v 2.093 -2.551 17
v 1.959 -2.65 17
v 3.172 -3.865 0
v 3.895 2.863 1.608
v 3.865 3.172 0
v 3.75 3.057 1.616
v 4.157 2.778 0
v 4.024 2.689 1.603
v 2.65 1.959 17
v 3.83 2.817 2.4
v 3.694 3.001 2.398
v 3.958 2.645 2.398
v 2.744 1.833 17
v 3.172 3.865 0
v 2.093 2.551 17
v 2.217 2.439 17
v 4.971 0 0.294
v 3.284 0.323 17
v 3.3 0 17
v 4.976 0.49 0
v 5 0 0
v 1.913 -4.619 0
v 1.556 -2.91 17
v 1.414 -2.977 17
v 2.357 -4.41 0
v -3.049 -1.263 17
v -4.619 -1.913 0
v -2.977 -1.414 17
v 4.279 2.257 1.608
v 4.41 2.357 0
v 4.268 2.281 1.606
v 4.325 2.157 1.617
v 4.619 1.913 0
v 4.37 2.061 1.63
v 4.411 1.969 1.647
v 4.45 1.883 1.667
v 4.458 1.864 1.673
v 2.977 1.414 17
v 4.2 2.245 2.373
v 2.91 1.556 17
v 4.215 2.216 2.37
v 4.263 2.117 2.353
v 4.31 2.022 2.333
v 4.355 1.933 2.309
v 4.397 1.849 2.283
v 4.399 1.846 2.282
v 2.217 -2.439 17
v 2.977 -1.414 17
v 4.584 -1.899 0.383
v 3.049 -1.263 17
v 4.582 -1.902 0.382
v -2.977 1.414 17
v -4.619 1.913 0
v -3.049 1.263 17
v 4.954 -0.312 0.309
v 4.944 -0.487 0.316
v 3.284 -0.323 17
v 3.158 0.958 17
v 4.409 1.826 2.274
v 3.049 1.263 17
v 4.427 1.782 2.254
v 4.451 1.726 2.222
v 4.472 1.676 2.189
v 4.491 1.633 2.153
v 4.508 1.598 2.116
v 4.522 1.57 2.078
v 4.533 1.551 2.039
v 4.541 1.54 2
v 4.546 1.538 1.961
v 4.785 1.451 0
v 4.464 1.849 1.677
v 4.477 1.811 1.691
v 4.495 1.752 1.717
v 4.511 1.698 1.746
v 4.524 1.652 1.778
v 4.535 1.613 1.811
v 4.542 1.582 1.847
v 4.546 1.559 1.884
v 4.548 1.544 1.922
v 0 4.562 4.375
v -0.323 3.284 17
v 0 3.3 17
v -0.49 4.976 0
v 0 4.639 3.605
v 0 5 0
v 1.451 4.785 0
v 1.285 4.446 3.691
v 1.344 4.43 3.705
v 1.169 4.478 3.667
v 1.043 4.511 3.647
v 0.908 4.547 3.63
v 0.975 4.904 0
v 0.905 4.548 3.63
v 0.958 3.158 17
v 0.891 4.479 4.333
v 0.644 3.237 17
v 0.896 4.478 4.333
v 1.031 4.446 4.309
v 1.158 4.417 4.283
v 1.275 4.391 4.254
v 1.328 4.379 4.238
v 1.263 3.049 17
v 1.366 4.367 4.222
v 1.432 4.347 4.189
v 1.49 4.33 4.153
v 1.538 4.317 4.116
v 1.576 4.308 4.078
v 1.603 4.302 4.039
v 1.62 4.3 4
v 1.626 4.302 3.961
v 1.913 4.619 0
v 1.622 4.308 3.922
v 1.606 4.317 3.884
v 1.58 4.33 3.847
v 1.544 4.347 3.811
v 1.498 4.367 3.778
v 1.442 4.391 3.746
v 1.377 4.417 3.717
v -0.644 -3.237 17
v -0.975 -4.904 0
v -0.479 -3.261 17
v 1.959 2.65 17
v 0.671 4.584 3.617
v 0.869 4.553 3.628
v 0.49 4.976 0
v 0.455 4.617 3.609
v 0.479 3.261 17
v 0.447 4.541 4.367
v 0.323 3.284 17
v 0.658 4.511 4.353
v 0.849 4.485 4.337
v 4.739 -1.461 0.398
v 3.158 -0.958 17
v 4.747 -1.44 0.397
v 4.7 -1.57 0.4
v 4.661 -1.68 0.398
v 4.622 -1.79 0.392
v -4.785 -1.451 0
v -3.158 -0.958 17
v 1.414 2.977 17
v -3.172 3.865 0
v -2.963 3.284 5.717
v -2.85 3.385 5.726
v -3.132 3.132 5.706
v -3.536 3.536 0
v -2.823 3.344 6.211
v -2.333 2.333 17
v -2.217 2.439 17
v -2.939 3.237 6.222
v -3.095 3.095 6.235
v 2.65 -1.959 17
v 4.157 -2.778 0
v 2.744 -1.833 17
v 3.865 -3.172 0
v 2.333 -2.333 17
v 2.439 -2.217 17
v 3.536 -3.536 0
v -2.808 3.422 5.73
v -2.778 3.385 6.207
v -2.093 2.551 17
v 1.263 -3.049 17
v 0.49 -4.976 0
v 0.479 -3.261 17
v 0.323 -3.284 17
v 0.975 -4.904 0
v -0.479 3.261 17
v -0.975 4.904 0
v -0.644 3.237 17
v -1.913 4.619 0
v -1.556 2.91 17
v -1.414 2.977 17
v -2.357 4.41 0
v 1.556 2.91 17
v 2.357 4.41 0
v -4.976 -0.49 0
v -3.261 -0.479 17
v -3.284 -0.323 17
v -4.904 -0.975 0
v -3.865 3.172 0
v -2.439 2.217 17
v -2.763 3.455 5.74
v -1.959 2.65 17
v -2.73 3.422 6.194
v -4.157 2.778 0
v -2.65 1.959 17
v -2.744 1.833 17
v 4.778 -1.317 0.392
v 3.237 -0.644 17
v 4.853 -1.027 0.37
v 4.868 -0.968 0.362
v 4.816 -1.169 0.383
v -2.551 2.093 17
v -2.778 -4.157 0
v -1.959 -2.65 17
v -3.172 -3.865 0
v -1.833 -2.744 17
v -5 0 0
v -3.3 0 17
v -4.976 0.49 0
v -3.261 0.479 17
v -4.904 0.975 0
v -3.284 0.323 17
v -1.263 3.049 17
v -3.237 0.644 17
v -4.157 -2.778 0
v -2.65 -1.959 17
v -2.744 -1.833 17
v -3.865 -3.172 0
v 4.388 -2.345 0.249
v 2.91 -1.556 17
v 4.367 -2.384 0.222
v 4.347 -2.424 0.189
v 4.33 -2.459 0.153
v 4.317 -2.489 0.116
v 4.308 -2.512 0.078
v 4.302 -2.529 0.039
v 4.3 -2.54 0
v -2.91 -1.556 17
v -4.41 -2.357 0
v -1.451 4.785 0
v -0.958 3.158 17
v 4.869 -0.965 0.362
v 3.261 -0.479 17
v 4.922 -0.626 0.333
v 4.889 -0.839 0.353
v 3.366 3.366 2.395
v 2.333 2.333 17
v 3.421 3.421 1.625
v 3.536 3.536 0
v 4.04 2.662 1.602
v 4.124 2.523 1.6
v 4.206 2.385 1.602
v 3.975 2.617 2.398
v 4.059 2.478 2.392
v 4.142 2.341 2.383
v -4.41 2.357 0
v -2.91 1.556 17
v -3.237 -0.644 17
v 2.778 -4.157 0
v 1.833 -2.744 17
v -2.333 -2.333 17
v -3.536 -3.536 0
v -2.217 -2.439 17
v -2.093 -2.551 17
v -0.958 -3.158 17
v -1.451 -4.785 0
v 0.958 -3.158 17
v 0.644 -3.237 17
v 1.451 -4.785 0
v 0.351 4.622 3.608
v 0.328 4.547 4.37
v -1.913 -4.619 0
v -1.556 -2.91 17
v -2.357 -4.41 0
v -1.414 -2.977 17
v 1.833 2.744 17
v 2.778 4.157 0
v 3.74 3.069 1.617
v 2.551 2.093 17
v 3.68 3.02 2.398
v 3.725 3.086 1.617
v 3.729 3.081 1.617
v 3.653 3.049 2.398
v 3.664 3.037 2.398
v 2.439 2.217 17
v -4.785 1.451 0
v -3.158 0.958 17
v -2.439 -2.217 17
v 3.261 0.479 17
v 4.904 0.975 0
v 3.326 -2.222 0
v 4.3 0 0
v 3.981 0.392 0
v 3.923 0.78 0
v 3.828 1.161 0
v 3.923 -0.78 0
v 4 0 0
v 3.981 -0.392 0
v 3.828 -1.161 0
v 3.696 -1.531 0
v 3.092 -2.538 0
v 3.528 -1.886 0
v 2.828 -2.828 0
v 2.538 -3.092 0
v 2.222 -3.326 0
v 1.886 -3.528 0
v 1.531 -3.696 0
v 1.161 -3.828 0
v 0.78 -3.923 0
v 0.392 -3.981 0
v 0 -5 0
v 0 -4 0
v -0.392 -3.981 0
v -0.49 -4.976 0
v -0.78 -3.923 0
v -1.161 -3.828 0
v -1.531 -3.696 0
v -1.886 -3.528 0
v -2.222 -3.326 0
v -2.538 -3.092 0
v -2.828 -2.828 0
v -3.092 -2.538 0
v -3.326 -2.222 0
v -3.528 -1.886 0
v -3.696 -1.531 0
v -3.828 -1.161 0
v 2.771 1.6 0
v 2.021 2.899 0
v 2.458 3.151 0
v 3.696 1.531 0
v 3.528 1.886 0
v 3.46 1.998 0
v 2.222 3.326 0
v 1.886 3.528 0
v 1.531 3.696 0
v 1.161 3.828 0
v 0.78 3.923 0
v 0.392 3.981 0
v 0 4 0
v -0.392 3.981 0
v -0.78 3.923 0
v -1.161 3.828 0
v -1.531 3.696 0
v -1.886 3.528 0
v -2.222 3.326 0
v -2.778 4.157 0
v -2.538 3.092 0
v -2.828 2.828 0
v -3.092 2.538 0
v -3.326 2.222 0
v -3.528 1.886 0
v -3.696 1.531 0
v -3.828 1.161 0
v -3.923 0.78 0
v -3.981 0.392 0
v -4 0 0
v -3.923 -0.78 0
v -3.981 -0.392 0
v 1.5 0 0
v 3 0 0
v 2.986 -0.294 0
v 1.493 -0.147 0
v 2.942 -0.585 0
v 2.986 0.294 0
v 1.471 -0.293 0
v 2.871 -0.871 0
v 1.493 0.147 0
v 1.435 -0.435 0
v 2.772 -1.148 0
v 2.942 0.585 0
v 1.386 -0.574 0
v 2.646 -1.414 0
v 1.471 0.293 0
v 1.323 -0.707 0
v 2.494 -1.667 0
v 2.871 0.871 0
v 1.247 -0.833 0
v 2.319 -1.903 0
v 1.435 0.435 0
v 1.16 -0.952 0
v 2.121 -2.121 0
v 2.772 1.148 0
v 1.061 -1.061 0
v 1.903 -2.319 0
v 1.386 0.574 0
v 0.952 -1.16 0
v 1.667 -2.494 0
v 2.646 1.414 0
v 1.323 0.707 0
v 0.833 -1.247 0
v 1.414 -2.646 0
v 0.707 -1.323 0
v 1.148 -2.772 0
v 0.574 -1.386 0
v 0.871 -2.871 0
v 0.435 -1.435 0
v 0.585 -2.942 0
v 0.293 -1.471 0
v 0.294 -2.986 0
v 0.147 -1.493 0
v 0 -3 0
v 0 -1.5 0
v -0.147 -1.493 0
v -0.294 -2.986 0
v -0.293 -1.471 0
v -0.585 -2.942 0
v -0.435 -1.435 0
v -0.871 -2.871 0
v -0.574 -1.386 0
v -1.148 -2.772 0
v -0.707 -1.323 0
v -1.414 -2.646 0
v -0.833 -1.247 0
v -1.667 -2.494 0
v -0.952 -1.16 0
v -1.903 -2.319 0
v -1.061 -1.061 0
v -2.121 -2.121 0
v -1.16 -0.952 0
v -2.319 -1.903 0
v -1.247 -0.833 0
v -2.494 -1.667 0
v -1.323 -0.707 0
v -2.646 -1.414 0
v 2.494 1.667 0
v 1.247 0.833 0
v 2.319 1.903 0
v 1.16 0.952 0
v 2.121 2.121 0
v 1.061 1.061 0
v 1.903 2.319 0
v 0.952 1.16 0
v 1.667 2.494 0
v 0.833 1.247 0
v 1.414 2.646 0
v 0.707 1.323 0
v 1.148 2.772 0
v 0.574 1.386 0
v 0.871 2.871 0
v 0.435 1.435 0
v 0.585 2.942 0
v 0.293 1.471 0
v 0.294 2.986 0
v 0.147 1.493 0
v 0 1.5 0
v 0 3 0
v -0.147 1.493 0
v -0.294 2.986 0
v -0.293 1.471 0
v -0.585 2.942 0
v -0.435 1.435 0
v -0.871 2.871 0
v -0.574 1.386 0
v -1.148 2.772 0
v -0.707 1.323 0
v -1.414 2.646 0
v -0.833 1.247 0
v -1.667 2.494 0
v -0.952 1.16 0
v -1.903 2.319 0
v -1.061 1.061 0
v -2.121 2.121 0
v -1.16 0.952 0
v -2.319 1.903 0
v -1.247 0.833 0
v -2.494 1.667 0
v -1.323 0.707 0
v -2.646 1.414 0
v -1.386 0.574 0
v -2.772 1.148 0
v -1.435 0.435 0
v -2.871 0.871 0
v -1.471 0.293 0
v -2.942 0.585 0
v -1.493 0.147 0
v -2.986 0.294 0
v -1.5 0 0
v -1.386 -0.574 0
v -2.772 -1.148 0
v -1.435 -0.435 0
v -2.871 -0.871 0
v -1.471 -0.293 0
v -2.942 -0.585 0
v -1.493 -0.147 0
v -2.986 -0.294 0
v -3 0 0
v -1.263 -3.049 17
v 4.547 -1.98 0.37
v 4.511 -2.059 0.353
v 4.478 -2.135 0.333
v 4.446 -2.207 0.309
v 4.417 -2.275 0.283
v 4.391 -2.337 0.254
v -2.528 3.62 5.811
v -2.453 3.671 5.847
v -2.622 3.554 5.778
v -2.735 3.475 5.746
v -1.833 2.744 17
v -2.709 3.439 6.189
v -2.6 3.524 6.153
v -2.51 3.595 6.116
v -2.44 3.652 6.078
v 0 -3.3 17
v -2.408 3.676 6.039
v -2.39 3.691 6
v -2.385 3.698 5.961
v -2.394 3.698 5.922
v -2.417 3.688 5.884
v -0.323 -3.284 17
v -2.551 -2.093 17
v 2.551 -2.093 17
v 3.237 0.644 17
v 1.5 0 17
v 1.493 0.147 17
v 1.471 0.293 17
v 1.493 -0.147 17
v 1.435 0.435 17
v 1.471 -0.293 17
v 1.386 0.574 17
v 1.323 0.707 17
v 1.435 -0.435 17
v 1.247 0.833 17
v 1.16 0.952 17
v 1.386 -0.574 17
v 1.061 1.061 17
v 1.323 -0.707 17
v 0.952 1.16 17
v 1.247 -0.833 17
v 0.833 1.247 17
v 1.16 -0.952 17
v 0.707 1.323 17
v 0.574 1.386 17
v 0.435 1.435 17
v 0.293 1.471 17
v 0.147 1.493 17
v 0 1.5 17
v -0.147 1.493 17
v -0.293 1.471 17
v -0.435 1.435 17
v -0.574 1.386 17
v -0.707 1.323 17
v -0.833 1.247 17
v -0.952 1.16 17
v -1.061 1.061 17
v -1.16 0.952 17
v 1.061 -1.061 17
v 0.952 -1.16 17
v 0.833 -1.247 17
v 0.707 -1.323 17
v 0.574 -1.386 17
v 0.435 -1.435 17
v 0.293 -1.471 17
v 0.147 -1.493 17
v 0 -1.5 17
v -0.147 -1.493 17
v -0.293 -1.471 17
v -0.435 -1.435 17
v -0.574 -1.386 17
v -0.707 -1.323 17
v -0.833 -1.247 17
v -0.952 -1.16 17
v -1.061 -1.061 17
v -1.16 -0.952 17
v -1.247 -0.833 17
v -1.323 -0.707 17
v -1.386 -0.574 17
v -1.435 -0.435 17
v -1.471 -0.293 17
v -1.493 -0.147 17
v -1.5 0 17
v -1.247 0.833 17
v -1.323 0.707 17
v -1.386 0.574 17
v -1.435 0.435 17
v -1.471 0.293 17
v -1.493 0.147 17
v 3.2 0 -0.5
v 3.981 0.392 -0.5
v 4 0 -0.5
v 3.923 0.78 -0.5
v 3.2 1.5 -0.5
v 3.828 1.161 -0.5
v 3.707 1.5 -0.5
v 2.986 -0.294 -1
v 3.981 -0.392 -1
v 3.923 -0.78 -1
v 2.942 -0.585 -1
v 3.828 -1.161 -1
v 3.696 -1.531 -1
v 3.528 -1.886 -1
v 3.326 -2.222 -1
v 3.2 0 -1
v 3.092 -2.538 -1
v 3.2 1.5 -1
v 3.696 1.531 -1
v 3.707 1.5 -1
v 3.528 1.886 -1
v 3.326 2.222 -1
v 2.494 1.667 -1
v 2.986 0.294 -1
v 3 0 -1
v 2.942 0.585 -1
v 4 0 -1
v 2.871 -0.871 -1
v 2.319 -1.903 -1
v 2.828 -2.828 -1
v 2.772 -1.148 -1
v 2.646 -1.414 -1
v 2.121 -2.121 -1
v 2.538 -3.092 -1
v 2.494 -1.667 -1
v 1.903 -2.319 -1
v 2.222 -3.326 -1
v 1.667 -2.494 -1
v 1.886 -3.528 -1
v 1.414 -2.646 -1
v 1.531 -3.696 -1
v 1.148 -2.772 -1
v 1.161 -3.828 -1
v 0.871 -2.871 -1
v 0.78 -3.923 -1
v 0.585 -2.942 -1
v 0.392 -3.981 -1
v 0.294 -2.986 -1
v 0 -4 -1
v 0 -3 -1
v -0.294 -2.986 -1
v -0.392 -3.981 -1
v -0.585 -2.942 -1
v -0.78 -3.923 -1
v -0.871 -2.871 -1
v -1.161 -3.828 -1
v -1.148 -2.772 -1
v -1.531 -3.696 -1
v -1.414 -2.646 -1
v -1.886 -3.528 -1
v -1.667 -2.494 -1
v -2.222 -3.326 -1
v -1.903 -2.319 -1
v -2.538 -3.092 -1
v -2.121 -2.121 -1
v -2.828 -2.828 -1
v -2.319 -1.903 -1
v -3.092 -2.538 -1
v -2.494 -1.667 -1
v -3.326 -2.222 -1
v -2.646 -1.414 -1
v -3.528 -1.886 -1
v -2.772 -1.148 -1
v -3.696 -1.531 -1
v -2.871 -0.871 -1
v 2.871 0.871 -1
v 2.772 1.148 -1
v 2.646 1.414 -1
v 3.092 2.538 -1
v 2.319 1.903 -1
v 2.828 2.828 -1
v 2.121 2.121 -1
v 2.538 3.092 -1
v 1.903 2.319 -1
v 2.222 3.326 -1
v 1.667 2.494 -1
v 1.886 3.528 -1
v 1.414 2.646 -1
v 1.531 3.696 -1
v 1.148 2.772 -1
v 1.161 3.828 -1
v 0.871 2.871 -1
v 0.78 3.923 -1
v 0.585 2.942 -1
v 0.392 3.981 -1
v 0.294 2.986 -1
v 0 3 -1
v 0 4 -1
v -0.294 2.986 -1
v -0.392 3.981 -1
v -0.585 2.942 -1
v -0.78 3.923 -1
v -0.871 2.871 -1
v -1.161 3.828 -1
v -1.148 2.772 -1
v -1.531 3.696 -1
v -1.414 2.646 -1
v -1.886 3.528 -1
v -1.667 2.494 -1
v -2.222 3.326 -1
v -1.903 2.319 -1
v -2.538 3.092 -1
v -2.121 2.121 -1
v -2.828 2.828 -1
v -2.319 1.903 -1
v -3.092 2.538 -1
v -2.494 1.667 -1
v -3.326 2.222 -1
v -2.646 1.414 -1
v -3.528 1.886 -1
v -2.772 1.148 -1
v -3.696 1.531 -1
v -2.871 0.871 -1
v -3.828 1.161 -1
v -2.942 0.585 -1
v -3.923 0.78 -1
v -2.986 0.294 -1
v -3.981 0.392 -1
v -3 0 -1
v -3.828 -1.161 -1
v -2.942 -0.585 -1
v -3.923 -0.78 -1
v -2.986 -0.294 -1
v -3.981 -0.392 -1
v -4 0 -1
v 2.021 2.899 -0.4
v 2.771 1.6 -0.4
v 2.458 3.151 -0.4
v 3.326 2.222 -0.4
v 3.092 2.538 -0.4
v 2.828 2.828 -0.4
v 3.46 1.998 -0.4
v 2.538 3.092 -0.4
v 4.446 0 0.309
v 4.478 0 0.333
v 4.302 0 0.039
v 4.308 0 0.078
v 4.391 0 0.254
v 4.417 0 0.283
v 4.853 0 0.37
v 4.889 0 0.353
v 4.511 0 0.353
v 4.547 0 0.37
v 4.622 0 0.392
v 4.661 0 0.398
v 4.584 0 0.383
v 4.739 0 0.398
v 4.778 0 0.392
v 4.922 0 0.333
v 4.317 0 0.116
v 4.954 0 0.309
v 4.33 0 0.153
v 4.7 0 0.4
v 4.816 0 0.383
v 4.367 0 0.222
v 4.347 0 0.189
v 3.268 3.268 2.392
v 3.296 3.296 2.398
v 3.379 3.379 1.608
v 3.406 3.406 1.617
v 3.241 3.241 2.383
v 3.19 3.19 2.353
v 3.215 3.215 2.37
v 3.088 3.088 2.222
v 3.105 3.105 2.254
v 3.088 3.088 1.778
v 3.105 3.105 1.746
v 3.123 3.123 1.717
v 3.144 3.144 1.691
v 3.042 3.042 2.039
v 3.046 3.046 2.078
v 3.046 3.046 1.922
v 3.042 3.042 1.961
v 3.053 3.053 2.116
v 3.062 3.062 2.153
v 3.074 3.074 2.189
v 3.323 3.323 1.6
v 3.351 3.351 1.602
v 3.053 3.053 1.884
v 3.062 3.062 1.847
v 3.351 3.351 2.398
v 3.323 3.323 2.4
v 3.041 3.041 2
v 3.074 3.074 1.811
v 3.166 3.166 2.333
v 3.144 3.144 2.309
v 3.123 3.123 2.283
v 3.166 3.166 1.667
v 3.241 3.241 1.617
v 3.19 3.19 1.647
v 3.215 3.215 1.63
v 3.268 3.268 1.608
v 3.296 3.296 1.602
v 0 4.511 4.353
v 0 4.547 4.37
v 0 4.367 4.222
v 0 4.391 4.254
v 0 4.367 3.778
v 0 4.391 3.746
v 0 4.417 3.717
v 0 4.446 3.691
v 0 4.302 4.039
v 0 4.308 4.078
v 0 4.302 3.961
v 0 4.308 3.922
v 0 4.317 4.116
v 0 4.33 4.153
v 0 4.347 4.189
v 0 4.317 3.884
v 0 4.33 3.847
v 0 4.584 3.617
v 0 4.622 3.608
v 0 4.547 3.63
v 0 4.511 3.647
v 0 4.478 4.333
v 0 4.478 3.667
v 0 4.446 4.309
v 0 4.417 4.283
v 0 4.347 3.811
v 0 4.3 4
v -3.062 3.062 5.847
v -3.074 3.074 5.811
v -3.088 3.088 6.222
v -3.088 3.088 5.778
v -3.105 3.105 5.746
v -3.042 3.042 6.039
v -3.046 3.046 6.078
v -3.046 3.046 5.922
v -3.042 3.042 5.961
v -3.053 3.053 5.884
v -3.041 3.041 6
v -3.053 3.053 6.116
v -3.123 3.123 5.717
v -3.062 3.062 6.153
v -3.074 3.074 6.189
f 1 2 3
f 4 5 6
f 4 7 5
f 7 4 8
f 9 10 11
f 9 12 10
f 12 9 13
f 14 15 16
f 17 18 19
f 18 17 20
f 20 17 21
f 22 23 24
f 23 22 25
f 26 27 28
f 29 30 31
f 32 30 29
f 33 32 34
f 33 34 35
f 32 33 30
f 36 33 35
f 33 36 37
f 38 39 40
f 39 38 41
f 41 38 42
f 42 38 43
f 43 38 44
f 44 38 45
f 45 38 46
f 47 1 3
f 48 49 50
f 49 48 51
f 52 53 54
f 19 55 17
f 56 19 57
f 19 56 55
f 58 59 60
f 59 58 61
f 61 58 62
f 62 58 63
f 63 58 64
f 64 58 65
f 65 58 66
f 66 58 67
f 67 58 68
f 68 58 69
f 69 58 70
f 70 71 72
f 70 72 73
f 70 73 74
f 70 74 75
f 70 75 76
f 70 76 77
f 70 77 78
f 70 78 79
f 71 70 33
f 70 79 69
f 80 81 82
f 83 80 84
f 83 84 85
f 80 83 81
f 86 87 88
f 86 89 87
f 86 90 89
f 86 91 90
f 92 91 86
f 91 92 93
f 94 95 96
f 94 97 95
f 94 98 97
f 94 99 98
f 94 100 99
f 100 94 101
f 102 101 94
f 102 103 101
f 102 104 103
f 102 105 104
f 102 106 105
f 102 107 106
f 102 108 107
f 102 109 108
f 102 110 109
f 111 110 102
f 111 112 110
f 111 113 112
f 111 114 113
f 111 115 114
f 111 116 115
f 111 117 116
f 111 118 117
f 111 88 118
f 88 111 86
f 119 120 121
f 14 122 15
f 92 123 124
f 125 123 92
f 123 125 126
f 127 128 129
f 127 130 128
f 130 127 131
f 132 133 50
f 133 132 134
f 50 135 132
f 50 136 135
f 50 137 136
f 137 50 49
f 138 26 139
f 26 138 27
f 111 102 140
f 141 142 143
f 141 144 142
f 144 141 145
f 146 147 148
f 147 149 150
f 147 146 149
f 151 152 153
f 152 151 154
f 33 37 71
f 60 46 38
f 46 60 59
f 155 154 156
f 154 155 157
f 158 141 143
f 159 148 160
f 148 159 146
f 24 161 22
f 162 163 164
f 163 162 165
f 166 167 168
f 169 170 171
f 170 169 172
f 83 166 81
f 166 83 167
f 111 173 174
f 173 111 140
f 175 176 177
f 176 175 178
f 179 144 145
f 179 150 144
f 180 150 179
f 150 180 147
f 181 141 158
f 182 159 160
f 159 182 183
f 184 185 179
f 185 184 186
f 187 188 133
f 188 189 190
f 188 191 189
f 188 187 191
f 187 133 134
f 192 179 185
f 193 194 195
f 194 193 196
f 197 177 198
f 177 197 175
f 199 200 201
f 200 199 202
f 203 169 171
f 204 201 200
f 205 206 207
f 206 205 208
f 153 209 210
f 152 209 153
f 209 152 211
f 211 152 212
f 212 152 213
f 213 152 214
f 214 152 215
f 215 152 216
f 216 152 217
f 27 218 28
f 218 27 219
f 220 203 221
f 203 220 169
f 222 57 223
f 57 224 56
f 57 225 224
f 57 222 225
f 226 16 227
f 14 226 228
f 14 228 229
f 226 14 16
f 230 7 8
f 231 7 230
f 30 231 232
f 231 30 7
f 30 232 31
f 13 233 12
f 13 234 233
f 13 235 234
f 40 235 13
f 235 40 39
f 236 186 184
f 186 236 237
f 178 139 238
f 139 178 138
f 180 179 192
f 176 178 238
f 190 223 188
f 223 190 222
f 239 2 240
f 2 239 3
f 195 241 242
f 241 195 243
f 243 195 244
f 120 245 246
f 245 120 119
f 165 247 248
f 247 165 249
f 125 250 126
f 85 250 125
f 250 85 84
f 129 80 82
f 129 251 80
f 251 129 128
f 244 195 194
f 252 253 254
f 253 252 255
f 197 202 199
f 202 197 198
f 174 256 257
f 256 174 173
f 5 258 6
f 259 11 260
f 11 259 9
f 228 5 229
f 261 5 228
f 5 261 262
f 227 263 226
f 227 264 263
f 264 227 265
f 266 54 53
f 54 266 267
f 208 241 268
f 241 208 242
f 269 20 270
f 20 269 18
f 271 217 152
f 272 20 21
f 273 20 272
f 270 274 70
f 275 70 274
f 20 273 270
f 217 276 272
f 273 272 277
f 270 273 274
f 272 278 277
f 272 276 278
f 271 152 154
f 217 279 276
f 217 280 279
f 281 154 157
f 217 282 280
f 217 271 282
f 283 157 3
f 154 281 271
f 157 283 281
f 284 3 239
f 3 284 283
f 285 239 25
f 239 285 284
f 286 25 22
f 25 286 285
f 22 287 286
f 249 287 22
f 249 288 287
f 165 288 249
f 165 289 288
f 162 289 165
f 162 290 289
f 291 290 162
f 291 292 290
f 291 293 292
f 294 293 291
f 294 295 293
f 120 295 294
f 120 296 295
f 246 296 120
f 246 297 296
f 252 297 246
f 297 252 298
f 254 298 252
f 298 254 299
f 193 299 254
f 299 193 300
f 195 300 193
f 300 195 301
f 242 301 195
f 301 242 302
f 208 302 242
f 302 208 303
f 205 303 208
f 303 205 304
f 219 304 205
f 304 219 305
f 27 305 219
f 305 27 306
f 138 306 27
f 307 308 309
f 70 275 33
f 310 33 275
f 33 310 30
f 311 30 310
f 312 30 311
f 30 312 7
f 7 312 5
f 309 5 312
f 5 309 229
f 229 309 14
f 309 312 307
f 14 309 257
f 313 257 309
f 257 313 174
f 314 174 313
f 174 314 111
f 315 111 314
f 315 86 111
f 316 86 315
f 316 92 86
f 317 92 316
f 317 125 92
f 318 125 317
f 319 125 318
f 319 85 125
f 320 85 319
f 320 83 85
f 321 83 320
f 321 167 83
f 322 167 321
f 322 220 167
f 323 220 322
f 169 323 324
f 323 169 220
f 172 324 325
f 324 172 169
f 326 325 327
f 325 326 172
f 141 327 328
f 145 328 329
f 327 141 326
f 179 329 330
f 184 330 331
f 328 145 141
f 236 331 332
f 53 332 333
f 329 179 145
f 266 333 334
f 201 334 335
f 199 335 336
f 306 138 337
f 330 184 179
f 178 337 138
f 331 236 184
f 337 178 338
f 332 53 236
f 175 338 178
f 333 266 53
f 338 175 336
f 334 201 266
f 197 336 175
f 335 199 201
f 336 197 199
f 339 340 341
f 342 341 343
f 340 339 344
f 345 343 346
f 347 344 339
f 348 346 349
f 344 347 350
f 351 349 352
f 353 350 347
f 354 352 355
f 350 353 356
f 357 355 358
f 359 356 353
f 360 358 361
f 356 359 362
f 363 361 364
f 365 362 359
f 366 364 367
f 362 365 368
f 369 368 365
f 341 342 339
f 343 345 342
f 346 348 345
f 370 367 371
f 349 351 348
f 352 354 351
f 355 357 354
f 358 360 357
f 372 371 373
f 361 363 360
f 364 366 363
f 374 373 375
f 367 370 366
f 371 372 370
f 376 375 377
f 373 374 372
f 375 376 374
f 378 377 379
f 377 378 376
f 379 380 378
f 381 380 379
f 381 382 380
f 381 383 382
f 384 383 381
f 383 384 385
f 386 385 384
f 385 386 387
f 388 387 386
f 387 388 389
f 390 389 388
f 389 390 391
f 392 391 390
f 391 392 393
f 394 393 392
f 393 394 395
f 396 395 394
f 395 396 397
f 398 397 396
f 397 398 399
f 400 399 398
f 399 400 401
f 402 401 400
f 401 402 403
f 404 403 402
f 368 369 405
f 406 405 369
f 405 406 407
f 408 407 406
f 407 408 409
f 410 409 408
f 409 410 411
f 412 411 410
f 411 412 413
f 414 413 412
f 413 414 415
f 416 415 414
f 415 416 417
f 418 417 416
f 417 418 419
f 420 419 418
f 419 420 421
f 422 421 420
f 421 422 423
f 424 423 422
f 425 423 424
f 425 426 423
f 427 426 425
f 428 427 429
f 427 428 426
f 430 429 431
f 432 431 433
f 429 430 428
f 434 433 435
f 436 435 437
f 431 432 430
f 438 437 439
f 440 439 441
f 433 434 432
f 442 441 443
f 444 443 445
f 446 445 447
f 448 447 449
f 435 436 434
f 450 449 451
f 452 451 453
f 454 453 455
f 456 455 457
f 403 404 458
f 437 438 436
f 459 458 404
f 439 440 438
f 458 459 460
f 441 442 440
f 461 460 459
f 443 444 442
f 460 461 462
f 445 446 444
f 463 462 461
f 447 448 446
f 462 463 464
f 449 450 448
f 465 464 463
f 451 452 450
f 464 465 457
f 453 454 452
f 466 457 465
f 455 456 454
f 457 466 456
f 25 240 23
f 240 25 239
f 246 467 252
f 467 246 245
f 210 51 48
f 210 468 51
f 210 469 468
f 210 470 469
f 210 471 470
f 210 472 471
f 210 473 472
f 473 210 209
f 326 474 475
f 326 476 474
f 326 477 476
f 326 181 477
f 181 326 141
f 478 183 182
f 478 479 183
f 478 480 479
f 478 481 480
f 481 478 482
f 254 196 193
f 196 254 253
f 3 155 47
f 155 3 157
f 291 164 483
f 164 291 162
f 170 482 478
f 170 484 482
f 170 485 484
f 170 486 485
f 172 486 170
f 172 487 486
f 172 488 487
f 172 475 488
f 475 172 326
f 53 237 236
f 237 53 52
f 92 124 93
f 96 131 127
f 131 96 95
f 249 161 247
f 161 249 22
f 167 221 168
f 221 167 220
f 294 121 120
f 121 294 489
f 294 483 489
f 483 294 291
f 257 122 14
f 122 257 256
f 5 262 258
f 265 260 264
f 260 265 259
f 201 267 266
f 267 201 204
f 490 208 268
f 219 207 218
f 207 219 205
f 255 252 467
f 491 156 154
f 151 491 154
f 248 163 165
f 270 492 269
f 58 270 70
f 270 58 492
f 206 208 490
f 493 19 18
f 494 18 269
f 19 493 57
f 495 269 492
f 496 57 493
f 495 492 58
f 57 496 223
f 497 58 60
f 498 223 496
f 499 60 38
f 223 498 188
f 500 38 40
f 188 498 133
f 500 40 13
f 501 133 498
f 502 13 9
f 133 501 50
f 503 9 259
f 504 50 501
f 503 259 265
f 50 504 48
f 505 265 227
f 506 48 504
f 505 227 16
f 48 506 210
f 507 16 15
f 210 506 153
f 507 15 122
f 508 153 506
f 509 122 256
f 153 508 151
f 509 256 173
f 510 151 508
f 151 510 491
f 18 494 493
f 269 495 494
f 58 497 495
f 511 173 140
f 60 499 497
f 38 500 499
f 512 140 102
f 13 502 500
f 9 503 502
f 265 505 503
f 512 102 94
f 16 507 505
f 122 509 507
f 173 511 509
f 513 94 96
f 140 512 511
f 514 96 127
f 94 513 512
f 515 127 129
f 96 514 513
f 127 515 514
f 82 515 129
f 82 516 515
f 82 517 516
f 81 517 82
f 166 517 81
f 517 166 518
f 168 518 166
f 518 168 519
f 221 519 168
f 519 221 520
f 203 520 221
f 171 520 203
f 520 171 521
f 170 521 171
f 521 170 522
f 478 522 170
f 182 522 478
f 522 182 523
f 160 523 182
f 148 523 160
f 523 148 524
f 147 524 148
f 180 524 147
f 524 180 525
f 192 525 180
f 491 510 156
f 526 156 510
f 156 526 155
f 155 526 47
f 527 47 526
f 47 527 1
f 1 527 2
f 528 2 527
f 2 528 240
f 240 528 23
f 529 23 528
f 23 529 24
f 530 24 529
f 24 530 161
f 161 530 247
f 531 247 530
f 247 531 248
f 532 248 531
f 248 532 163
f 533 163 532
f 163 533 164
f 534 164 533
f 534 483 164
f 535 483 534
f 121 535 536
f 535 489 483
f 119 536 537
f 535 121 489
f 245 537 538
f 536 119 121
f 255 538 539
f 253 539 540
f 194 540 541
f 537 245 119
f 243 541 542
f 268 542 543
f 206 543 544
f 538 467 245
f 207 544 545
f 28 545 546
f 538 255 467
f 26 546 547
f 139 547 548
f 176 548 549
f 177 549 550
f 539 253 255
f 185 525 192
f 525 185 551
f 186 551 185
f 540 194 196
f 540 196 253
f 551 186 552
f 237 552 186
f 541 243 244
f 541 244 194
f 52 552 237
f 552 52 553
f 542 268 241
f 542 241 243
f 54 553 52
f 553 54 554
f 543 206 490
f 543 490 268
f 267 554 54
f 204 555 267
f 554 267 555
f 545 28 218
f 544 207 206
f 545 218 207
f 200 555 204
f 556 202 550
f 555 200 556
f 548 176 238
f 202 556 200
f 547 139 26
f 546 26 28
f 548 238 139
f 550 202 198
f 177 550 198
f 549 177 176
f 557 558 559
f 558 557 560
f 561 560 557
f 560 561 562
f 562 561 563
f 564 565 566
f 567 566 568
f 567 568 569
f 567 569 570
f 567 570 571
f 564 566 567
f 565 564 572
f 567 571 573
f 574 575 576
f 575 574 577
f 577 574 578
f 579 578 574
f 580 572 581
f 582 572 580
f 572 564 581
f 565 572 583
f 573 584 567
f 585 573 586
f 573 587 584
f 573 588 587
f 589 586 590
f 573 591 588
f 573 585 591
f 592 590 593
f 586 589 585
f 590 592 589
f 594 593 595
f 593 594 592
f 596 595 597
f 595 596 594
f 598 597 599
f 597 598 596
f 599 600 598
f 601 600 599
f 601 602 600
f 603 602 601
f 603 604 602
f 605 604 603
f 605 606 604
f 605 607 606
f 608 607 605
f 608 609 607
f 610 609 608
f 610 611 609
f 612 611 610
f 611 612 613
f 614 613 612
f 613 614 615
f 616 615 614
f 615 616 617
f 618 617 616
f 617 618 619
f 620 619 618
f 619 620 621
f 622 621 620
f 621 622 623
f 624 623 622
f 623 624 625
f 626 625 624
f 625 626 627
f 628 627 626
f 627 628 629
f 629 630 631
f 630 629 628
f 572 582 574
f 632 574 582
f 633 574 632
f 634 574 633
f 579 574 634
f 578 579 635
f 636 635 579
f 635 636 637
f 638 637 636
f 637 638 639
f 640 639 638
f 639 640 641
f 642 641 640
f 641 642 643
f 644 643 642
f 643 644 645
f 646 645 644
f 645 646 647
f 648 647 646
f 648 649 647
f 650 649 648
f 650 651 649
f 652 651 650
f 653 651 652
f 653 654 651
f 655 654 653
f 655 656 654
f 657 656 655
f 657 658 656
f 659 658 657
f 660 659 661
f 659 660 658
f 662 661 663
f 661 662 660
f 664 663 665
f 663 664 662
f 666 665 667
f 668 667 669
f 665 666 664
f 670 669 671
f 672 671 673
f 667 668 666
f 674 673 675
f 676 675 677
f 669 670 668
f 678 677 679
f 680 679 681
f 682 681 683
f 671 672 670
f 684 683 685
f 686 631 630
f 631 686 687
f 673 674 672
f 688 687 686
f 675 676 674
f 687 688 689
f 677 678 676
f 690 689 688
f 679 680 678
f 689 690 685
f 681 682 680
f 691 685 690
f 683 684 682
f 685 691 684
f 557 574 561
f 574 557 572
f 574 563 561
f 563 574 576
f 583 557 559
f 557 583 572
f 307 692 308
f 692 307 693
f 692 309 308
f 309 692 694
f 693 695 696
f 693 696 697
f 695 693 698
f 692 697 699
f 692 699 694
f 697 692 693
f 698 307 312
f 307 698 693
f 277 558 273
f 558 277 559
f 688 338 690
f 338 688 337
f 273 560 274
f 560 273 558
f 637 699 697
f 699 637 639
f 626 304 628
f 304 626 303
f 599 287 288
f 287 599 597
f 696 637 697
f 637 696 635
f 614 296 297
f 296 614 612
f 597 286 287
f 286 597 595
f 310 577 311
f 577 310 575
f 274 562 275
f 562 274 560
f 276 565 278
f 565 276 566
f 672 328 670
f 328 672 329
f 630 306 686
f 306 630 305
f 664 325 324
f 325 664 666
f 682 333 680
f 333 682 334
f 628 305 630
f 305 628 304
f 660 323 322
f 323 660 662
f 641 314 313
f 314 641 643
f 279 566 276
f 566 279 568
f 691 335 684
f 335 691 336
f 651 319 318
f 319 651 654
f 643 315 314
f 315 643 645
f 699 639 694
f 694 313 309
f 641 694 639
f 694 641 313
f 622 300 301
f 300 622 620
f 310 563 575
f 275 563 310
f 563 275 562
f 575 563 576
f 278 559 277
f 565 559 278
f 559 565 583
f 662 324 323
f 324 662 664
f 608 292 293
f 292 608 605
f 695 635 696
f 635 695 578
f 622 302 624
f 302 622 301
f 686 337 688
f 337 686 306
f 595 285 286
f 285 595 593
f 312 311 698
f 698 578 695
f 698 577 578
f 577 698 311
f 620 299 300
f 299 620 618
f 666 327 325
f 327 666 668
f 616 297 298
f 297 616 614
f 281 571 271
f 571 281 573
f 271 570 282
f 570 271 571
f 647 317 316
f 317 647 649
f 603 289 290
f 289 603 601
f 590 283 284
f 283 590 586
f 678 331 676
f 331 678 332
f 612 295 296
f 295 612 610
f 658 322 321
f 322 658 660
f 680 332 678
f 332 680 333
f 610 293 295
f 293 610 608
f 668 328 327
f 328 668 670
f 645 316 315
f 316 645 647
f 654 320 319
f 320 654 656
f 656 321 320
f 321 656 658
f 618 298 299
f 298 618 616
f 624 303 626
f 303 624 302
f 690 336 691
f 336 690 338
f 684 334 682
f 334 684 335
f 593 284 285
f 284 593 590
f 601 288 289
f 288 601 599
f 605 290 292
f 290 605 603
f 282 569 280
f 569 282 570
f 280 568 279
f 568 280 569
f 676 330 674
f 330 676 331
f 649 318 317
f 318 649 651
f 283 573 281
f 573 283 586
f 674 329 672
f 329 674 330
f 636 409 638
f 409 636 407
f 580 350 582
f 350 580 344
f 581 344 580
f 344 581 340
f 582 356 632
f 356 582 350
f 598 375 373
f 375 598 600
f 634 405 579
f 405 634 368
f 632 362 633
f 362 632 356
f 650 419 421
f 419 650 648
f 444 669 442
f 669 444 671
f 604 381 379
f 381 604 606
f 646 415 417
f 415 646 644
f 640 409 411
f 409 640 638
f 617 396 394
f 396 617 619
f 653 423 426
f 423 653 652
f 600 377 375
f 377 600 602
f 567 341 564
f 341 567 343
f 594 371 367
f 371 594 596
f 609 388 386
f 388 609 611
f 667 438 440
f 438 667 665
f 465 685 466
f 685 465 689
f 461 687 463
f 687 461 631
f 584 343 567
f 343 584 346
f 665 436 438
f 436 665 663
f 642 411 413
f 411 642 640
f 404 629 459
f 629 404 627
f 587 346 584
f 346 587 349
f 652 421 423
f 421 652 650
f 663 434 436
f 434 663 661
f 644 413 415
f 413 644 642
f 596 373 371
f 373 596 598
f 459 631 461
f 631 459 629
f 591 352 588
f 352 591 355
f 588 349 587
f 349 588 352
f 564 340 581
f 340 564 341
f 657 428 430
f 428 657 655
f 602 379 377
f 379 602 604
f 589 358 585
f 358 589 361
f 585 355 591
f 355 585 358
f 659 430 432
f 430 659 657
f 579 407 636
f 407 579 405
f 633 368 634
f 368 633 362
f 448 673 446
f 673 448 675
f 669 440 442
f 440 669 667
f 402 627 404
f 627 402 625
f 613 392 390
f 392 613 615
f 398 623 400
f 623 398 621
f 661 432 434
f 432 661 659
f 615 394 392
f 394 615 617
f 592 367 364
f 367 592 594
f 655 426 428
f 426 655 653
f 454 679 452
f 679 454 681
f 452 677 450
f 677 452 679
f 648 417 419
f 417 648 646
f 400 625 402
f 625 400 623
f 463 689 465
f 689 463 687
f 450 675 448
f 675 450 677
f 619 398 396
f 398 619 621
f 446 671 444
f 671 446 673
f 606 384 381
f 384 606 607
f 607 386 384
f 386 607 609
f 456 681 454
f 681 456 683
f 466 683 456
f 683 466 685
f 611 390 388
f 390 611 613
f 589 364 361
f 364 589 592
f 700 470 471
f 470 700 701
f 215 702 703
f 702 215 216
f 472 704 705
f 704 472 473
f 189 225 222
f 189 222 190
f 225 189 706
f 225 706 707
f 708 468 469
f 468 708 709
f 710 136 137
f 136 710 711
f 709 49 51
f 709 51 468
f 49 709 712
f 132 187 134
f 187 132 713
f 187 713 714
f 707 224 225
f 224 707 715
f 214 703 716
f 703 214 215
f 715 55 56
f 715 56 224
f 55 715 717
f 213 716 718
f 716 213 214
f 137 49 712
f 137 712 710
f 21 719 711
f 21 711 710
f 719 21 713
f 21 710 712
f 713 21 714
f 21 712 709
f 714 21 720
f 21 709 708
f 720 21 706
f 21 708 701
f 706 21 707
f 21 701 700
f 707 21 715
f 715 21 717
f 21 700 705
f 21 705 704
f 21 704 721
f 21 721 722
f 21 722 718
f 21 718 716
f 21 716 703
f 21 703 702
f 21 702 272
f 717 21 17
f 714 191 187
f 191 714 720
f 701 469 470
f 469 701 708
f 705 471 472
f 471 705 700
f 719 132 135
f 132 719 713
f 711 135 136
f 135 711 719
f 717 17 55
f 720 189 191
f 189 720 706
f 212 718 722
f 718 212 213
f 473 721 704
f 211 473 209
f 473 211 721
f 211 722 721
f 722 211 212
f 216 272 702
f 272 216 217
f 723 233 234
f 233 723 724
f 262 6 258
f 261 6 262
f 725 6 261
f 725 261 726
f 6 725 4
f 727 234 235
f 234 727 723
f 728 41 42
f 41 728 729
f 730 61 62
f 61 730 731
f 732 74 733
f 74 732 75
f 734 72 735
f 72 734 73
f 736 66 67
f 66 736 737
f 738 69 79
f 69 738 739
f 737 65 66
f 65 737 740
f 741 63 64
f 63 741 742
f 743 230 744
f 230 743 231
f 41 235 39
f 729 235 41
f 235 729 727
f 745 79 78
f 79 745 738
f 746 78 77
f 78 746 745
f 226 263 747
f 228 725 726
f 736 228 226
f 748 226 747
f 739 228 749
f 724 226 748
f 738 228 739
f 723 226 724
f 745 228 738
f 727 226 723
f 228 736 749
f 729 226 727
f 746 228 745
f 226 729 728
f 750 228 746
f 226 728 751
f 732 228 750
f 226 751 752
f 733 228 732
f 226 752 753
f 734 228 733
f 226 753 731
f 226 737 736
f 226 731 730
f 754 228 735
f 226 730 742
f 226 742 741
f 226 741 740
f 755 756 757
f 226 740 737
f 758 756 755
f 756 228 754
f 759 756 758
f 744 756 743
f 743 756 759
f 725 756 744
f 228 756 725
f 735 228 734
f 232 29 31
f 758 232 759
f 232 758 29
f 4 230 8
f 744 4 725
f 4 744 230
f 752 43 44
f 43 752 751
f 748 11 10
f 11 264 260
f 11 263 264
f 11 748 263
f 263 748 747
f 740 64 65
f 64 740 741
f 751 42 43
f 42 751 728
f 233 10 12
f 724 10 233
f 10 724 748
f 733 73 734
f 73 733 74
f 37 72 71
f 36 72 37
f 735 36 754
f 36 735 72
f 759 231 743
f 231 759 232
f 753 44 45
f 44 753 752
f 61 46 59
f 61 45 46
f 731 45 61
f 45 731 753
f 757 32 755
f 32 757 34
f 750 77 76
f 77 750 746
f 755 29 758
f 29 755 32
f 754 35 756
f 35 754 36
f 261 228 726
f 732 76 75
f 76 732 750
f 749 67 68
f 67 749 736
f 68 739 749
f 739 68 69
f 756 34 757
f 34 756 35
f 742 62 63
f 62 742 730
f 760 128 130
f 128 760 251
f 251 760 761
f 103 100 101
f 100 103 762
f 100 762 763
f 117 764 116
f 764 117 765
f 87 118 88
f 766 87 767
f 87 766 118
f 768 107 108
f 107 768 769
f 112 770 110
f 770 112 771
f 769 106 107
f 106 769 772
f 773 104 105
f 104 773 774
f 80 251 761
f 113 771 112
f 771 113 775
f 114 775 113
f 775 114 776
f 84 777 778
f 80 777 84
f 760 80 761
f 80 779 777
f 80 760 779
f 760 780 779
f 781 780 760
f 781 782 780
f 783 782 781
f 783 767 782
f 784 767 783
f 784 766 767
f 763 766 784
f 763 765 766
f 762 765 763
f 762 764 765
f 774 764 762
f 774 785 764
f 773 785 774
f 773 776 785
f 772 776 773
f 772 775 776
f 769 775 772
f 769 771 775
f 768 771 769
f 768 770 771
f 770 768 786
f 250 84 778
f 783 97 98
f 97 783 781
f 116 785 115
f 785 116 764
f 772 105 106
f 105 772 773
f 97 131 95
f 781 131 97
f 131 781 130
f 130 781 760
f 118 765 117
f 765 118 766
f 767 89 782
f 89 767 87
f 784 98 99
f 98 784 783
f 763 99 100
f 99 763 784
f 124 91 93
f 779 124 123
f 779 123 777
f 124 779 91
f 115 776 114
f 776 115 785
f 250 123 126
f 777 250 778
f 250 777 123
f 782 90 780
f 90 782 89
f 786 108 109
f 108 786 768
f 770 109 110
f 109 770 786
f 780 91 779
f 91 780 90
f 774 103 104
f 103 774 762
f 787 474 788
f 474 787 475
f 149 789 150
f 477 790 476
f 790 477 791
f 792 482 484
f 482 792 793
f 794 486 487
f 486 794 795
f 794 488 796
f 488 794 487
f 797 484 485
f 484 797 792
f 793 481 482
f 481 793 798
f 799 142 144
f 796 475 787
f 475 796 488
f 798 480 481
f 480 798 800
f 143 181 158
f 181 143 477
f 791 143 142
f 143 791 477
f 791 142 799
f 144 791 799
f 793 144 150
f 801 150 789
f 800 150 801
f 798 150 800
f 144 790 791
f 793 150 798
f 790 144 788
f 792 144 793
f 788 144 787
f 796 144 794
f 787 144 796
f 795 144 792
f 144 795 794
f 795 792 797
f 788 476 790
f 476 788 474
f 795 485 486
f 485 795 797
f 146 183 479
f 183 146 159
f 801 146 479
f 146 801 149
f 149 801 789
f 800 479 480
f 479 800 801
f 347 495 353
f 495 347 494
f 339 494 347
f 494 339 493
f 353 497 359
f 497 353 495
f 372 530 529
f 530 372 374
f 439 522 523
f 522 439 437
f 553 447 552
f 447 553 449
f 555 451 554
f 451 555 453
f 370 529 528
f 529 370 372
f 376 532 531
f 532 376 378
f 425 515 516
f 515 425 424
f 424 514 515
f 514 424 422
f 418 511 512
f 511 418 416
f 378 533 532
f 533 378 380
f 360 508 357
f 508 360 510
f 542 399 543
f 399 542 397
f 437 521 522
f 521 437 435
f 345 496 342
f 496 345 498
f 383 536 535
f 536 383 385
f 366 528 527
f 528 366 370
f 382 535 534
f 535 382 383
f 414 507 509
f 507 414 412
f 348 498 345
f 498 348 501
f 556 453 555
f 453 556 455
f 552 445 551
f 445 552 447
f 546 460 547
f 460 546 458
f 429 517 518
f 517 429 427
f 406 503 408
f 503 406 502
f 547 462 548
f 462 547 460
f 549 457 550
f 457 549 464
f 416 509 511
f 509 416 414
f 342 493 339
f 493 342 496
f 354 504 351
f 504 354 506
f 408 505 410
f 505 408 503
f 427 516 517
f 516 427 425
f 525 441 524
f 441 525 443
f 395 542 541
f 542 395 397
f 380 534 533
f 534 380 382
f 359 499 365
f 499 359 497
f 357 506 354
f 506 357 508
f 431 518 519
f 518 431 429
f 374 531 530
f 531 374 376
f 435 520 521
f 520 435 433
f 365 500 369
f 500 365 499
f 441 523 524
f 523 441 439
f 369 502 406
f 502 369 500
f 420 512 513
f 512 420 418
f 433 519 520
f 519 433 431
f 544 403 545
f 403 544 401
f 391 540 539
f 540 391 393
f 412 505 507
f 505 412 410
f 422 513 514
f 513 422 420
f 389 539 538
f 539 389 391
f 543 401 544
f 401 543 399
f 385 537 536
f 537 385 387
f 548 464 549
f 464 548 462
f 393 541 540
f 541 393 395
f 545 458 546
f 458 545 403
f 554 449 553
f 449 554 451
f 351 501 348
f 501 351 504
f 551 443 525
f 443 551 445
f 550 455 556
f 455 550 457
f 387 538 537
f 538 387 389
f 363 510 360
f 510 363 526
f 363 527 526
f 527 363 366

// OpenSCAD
// CyberWand v21.0 - 杖尖 LED 座 OpenSCAD 模型
// 用于 3D 打印的 STL 文件生成

// 参数设置
tip_length = 25;         // 杖尖长度 mm
tip_base_diameter = 10;  // 底部直径 mm（连接杖身）
tip_tip_diameter = 5;    // 顶端直径 mm
led_hole_diameter = 6;   // LED 开孔直径 mm（WS2812B 5x5mm）

// 螺纹参数（连接杖身）
thread_diameter = 6;
thread_length = 8;

// 透光设计
led_chamber_depth = 8;   // LED 腔体深度
led_chamber_diameter = 8; // LED 腔体直径

$fn = 64;  // 圆滑度

// 模块：锥形杖尖主体
module tip_body() {
    difference() {
        // 外锥体
        cylinder(h = tip_length, d1 = tip_base_diameter, d2 = tip_tip_diameter);
        // LED 腔体（中空）
        translate([0, 0, tip_length - led_chamber_depth])
            cylinder(h = led_chamber_depth + 1, d1 = led_chamber_diameter, d2 = led_hole_diameter);
    }
}

// 模块：内螺纹（连接杖身）
module internal_thread() {
    difference() {
        cylinder(h = thread_length + 2, d = thread_diameter + 2);
        cylinder(h = thread_length + 4, d = thread_diameter);
        // 简化螺纹
        for (i = [0:12]) {
            rotate([0, 0, i * 30])
                translate([thread_diameter/2 + 0.2, 0, i * 0.6])
                    cube([1, 1.5, 0.5]);
        }
    }
}

// 模块：导线孔（内部通道）
module wire_channel() {
    translate([0, 0, -1])
        cylinder(h = tip_length + 2, d = 3);  // Φ3mm 通道
}

// 模块：表面纹理（螺旋纹）
module surface_texture() {
    for (i = [0:8]) {
        rotate([0, 0, i * 45])
            translate([tip_base_diameter/2 - 0.3, 0, i * 2])
                rotate([90, 0, 0])
                    cylinder(h = tip_base_diameter, d = 0.8);
    }
}

// 主模型：杖尖 LED 座
module tip_v21() {
    difference() {
        union() {
            // 杖尖主体
            tip_body();
            // 底部内螺纹
            translate([0, 0, -1])
                internal_thread();
        }
        union() {
            // 导线通道
            wire_channel();
            // 表面纹理（凹陷）
            surface_texture();
        }
    }
}

// 生成模型
tip_v21();

// 注释：导出 STL 命令
// openscad -o tip_v21.stl tip_v21.scad
